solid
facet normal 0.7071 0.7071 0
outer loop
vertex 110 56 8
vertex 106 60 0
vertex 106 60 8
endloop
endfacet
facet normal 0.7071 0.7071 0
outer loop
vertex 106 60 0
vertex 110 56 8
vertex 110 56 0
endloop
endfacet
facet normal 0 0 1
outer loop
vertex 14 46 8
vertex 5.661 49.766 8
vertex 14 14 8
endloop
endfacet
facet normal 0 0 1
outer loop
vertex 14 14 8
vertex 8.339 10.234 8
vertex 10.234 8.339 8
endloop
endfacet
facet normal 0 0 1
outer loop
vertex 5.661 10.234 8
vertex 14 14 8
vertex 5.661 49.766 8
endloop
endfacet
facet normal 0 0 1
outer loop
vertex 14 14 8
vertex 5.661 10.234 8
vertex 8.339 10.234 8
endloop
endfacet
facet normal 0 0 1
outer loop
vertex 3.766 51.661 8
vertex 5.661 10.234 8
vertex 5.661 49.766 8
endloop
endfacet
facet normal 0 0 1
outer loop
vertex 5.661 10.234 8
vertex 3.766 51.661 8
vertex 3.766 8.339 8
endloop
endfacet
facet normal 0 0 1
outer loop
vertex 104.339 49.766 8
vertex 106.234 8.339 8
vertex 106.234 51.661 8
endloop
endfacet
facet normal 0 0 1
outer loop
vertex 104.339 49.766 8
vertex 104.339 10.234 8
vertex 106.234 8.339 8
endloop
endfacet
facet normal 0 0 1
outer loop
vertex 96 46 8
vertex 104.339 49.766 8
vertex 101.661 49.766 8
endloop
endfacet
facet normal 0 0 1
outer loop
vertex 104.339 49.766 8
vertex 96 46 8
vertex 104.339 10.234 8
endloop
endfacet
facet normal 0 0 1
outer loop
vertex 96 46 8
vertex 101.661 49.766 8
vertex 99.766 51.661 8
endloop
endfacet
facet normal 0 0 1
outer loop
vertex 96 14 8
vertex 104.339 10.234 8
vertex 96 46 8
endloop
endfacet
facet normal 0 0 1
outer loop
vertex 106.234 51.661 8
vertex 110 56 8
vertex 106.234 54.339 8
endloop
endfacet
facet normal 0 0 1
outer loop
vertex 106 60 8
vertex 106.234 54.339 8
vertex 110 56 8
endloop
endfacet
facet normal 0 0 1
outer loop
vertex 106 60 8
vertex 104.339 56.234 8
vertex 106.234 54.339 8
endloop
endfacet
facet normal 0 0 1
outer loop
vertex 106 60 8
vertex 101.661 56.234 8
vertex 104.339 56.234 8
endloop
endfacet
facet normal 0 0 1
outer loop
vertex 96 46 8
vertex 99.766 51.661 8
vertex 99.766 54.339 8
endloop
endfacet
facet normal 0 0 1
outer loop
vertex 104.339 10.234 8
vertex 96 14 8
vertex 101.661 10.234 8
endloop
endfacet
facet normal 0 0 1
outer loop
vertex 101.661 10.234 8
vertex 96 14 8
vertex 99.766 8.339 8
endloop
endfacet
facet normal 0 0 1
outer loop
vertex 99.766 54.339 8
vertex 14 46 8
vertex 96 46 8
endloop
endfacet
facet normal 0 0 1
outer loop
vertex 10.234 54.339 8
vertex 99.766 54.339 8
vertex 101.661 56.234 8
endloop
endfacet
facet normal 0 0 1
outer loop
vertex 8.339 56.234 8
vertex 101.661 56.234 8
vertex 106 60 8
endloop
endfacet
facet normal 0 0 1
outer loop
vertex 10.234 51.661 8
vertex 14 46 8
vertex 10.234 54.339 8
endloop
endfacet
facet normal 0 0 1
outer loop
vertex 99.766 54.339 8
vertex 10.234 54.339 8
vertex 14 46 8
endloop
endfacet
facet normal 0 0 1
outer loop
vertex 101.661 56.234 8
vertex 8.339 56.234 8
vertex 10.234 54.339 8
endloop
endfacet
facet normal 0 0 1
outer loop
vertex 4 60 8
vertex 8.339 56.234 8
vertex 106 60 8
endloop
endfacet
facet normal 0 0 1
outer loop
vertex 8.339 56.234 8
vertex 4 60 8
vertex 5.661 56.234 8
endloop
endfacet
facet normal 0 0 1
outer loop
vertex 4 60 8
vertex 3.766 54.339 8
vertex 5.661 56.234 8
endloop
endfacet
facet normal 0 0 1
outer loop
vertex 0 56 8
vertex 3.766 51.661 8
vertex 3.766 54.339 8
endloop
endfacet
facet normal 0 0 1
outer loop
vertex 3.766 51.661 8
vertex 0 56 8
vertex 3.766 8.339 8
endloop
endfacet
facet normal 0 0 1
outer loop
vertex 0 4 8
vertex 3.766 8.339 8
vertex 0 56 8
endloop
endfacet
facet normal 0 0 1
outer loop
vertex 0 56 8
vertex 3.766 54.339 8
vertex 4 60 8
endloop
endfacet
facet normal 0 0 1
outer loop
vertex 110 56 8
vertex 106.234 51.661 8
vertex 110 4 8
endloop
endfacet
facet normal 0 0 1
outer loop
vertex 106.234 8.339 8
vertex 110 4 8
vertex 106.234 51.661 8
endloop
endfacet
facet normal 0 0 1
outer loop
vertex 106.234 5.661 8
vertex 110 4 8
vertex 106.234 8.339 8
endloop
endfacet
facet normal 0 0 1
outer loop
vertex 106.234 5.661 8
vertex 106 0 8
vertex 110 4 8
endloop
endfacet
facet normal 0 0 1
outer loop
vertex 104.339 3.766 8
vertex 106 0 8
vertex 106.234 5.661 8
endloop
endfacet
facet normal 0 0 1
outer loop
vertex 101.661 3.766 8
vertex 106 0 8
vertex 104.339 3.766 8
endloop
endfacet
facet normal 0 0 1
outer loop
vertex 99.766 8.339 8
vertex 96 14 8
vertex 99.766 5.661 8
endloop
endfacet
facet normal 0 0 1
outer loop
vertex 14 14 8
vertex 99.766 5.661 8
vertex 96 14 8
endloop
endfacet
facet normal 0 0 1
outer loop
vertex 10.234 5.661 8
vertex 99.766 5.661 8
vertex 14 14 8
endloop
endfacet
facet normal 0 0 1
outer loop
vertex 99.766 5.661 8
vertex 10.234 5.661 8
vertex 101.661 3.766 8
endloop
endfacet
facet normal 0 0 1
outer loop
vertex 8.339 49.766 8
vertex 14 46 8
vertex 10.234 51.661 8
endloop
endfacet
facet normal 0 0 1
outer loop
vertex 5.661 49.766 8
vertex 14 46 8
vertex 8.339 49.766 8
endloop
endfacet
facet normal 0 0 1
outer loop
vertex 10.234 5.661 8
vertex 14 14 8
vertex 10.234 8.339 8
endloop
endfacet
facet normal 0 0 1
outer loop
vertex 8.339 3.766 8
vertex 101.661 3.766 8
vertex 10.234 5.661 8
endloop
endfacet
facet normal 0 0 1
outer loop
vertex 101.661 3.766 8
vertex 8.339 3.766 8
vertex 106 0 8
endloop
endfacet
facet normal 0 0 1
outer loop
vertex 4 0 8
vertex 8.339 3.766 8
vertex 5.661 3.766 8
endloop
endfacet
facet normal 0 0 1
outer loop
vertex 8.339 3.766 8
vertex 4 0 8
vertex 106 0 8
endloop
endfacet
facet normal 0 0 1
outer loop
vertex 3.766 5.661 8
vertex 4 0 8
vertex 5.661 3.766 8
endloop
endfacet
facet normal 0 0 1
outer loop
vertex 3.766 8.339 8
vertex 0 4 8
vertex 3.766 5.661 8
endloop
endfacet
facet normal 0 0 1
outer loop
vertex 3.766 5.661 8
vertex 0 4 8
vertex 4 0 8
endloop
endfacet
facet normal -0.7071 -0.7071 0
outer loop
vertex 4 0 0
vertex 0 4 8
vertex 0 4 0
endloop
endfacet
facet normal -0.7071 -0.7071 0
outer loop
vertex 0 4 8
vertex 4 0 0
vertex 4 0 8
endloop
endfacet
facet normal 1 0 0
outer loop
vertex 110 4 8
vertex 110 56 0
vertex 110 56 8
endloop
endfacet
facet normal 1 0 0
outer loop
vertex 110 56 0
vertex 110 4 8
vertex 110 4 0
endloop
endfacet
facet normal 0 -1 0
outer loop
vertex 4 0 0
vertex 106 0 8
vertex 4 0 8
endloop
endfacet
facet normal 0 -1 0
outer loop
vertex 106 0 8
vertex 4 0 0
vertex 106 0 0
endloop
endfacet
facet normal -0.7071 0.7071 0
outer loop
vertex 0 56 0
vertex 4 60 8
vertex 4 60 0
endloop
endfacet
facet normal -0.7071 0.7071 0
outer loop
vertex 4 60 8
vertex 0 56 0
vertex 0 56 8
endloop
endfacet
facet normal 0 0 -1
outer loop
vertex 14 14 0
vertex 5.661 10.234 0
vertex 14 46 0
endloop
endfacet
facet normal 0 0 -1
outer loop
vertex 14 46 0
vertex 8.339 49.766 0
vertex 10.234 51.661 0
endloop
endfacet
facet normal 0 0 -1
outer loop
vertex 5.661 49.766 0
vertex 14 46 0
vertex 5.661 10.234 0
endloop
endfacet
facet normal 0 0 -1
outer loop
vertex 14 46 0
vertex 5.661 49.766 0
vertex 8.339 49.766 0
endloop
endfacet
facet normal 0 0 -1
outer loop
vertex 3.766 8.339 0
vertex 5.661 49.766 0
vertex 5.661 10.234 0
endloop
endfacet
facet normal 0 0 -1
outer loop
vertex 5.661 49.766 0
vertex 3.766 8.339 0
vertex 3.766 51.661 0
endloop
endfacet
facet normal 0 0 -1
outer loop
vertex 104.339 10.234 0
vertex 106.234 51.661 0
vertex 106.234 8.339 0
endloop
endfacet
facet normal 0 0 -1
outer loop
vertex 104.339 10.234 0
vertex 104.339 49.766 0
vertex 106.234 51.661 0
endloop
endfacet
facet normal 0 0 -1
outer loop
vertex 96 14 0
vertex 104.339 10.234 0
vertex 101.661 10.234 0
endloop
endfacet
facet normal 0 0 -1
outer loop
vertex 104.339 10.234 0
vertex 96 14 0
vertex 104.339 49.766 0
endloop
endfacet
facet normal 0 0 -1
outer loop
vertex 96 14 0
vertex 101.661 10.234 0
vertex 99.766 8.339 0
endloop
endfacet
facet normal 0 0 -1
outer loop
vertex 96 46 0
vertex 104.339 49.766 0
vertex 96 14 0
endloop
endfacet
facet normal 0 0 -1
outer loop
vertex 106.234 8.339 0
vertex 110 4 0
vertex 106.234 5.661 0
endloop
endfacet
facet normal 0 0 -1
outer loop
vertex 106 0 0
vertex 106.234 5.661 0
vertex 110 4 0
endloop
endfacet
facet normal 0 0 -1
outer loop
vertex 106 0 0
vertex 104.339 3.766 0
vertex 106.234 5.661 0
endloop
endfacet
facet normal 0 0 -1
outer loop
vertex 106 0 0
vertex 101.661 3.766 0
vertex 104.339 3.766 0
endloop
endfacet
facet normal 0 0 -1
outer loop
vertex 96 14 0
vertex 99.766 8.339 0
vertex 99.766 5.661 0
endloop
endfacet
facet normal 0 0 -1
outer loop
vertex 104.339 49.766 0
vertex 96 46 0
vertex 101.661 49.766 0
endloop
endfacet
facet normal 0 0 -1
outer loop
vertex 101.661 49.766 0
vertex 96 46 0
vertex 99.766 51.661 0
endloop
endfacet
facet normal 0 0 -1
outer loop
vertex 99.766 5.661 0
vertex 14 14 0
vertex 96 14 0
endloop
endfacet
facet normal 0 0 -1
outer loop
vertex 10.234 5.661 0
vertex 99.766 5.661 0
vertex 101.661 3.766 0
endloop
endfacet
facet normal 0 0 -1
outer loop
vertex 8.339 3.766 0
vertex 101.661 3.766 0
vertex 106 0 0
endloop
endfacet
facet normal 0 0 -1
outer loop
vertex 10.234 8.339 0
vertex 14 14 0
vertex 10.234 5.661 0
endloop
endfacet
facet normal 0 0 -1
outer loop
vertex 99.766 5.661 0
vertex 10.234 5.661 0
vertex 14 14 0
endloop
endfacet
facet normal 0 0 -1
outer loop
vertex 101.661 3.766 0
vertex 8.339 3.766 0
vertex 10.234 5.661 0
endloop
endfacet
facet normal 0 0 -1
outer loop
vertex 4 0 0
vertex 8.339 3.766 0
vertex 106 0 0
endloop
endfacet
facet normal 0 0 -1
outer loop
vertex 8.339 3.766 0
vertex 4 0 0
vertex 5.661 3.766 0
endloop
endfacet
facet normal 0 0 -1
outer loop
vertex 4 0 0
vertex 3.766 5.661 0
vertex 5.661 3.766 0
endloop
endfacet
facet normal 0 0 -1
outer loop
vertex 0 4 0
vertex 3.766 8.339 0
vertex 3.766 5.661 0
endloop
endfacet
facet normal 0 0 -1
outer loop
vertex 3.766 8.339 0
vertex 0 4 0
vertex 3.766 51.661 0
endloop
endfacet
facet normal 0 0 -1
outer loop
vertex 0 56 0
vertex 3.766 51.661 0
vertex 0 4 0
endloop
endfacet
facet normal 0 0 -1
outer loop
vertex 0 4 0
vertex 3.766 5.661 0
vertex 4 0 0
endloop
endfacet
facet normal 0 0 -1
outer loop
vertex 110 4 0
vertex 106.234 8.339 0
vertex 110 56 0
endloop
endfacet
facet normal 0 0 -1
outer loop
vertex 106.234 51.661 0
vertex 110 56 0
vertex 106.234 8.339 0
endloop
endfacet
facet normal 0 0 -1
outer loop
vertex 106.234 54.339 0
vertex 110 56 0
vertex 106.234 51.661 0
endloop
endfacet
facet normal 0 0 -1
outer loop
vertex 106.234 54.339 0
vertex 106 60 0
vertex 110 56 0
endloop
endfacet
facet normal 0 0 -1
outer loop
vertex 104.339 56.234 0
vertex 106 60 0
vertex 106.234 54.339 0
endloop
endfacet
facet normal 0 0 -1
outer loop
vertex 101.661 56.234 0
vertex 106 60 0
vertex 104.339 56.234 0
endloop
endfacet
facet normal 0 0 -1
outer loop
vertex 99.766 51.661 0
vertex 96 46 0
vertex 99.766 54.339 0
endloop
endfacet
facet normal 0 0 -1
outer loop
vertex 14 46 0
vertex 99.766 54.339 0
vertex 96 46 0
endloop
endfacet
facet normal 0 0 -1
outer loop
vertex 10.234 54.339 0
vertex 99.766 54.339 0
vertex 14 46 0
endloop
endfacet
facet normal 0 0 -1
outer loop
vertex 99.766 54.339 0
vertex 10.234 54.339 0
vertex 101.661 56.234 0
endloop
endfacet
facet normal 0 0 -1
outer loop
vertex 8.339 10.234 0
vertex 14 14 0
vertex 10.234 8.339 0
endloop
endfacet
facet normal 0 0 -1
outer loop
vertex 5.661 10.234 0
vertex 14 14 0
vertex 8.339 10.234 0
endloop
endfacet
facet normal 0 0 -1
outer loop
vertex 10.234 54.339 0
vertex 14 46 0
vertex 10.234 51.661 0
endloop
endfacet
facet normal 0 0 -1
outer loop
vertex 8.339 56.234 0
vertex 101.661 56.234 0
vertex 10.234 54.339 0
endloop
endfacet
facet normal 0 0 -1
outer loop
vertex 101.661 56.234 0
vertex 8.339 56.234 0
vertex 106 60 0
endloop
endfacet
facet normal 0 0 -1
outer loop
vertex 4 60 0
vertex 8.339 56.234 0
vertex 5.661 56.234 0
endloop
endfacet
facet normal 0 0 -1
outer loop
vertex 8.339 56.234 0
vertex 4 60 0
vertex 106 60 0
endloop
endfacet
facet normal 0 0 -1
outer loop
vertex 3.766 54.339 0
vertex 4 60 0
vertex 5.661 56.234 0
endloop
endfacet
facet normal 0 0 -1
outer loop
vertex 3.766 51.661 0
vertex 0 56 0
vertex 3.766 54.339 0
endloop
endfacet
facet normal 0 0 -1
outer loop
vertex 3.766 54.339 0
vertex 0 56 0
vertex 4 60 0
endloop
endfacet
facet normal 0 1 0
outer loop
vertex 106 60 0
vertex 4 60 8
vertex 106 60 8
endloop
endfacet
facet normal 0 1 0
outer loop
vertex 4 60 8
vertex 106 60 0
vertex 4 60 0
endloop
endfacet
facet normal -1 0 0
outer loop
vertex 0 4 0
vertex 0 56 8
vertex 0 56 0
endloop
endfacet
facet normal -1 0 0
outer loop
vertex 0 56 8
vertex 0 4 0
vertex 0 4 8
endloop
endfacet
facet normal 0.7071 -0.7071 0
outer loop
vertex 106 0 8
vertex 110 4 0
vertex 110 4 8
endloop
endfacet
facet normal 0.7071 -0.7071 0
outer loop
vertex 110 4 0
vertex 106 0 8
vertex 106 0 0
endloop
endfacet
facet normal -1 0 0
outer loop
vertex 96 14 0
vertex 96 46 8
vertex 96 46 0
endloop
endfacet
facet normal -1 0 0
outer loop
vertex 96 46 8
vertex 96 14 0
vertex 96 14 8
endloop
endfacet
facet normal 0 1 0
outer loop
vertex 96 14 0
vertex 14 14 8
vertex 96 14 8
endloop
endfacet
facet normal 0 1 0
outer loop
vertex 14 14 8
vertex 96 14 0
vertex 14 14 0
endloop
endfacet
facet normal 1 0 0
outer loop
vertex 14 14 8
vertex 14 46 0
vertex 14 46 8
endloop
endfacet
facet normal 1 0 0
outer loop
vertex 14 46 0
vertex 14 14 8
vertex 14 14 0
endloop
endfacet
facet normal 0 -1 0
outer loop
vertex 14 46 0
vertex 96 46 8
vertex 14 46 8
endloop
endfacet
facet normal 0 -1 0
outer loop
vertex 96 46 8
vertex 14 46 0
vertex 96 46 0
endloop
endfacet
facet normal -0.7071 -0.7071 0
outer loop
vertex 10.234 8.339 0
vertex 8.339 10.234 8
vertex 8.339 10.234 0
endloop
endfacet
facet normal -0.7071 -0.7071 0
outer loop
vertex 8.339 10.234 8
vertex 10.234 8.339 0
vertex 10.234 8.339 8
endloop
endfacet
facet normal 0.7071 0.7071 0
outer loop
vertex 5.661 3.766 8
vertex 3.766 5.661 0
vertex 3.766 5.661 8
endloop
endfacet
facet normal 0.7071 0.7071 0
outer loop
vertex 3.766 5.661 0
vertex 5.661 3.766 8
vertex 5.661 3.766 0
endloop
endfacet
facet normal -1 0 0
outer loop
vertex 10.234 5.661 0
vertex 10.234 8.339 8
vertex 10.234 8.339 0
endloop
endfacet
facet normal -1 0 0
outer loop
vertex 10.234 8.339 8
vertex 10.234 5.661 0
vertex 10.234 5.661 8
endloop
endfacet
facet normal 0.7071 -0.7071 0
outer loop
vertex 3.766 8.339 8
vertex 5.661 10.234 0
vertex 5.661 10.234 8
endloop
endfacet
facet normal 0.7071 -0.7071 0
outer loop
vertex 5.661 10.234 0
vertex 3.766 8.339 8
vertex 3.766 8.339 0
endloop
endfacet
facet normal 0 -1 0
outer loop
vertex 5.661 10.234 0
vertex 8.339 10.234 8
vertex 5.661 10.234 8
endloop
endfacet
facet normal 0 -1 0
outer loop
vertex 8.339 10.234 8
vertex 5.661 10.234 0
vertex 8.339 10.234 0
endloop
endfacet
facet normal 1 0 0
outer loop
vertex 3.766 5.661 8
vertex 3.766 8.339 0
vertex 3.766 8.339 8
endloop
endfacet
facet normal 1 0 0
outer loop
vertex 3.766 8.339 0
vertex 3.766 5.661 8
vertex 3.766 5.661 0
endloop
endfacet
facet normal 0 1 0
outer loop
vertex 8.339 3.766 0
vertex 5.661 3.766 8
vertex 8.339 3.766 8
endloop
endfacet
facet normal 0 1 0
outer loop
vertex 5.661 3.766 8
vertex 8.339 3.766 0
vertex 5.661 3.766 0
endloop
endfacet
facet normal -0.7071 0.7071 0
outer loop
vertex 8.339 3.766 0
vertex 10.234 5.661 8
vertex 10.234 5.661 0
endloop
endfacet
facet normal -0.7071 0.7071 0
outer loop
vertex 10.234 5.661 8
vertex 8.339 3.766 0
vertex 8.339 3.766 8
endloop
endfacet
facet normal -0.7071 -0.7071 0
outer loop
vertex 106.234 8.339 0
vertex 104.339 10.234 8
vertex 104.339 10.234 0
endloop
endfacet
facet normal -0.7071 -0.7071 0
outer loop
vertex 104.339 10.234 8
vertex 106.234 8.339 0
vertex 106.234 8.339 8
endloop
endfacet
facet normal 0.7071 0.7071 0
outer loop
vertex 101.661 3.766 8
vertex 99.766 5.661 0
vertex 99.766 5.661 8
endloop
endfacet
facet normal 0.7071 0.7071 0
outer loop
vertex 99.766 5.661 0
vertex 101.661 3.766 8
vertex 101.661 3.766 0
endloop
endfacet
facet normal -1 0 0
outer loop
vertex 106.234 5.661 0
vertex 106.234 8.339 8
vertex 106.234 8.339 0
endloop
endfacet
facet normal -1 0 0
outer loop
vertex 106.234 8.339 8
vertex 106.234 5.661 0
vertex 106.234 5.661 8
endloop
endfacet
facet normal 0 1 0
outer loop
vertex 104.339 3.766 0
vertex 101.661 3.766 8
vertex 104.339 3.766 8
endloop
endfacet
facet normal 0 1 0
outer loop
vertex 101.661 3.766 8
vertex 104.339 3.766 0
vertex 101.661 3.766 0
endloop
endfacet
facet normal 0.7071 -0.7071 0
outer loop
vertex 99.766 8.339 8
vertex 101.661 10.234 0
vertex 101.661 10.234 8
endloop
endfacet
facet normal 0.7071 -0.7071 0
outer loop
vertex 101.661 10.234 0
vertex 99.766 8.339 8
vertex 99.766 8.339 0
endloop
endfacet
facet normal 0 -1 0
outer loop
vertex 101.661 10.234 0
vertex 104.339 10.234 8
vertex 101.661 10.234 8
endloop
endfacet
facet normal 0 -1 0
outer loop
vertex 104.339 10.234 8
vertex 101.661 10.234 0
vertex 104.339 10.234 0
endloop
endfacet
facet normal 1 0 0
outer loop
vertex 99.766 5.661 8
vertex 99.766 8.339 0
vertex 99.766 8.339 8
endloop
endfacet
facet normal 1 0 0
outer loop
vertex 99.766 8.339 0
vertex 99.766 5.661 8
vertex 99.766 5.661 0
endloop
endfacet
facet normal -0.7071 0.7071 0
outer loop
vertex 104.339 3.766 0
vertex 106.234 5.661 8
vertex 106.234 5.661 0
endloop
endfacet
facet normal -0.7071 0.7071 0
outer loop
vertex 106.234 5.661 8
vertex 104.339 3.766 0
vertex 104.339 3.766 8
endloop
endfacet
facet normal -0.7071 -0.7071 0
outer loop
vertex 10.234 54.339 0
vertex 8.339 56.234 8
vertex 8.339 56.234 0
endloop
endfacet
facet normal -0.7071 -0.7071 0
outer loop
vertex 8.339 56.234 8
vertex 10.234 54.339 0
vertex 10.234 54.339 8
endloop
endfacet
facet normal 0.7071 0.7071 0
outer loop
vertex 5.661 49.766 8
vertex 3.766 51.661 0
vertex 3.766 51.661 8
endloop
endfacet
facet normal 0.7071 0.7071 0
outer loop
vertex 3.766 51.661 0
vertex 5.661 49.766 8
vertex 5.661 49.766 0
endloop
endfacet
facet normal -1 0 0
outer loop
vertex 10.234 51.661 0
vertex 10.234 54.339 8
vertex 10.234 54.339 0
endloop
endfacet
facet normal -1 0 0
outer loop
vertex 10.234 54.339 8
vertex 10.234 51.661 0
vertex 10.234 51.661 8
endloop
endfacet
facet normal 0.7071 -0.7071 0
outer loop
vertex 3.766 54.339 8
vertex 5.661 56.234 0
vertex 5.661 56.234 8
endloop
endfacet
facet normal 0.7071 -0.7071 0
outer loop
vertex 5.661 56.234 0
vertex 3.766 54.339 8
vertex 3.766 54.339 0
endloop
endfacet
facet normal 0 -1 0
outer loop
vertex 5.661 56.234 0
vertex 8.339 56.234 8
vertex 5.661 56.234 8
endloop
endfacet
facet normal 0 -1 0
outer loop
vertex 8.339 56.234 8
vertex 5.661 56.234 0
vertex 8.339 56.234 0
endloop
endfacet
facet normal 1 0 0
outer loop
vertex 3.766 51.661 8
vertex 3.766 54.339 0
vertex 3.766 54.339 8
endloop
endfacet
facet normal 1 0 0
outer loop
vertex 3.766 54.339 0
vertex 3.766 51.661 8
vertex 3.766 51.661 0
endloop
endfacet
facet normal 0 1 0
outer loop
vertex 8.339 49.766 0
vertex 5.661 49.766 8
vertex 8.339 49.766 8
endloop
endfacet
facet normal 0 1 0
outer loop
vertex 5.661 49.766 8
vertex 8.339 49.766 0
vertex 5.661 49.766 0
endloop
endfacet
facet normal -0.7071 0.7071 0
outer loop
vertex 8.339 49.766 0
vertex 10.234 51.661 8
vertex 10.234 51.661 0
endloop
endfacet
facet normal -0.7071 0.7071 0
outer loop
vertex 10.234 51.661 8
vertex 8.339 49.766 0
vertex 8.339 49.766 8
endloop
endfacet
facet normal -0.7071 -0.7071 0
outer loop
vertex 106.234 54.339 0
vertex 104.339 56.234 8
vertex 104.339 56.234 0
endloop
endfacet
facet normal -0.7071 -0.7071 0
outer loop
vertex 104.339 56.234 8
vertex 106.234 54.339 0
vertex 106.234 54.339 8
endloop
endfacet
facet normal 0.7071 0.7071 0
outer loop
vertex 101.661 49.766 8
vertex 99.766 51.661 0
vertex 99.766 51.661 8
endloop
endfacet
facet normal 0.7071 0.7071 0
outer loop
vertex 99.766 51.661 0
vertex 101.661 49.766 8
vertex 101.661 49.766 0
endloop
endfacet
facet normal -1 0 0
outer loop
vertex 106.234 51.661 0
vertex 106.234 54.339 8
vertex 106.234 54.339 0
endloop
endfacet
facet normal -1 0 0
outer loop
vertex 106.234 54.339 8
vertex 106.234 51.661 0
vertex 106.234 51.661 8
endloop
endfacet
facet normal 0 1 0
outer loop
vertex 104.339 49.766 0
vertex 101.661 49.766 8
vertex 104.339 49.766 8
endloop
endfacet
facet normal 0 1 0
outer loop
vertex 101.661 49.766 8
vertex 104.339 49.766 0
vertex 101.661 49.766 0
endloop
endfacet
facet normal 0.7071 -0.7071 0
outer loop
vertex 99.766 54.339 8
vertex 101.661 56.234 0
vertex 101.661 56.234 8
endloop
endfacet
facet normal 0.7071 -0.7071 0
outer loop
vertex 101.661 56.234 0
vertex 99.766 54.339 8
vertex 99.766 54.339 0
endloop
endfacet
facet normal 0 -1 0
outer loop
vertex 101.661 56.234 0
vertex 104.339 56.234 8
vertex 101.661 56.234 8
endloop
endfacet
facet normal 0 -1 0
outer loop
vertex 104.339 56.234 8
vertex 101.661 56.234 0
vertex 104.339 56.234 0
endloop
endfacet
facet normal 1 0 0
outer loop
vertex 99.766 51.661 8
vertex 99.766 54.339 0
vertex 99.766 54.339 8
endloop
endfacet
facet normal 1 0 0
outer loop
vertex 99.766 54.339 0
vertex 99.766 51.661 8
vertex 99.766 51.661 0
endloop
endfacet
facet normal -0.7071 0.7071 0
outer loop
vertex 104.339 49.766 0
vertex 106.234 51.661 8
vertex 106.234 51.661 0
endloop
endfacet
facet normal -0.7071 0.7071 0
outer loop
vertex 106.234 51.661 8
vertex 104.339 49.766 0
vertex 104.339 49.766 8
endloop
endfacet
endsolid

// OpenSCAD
$fn = 32;

// ----------------------------------------------------------------------
// Frame plate: 110 x 60 frame, 14 mm rails
// ----------------------------------------------------------------------

// --- parameters (mm) ---
plate_l = 110;            // plate length, X
plate_w = 60;             // plate width, Y
plate_t = 8;              // plate thickness, Z (extrusion height)
corner_c = 4;             // corner chamfer
frame_bar = 14;           // frame rail width
bolt_r = 3.5;             // corner bolt window radius
bolt_inset = 7;           // bolt centre inset from the edges
fit_tol = 0.05;           // declared fit tolerance (prompt contract)
free_tol = 0.3;           // declared free tolerance (prompt contract)

win_l = plate_l - 2 * frame_bar;  // window length
win_w = plate_w - 2 * frame_bar;  // window width
bolt_d = 2 * bolt_r;  // corner hole diameter

profile = [[4, 0], [106, 0], [110, 4], [110, 56], [106, 60], [4, 60], [0, 56], [0, 4]];  // primary outline, 8 points, counter clockwise
void_1 = [[14, 14], [96, 14], [96, 46], [14, 46]];  // the window, 4 points
void_2 = [[10.234, 8.339], [8.339, 10.234], [5.661, 10.234], [3.766, 8.339], [3.766, 5.661], [5.661, 3.766], [8.339, 3.766], [10.234, 5.661]];  // corner bolt window, 8 points
void_3 = [[106.234, 8.339], [104.339, 10.234], [101.661, 10.234], [99.766, 8.339], [99.766, 5.661], [101.661, 3.766], [104.339, 3.766], [106.234, 5.661]];  // corner bolt window, 8 points
void_4 = [[10.234, 54.339], [8.339, 56.234], [5.661, 56.234], [3.766, 54.339], [3.766, 51.661], [5.661, 49.766], [8.339, 49.766], [10.234, 51.661]];  // corner bolt window, 8 points
void_5 = [[106.234, 54.339], [104.339, 56.234], [101.661, 56.234], [99.766, 54.339], [99.766, 51.661], [101.661, 49.766], [104.339, 49.766], [106.234, 51.661]];  // corner bolt window, 8 points

// --- the one profile operation ---
difference() {
  linear_extrude(height = plate_t) polygon(points = profile);
  translate([0, 0, -1])
    linear_extrude(height = plate_t + 2) polygon(points = void_1);
  translate([0, 0, -1])
    linear_extrude(height = plate_t + 2) polygon(points = void_2);
  translate([0, 0, -1])
    linear_extrude(height = plate_t + 2) polygon(points = void_3);
  translate([0, 0, -1])
    linear_extrude(height = plate_t + 2) polygon(points = void_4);
  translate([0, 0, -1])
    linear_extrude(height = plate_t + 2) polygon(points = void_5);
}
